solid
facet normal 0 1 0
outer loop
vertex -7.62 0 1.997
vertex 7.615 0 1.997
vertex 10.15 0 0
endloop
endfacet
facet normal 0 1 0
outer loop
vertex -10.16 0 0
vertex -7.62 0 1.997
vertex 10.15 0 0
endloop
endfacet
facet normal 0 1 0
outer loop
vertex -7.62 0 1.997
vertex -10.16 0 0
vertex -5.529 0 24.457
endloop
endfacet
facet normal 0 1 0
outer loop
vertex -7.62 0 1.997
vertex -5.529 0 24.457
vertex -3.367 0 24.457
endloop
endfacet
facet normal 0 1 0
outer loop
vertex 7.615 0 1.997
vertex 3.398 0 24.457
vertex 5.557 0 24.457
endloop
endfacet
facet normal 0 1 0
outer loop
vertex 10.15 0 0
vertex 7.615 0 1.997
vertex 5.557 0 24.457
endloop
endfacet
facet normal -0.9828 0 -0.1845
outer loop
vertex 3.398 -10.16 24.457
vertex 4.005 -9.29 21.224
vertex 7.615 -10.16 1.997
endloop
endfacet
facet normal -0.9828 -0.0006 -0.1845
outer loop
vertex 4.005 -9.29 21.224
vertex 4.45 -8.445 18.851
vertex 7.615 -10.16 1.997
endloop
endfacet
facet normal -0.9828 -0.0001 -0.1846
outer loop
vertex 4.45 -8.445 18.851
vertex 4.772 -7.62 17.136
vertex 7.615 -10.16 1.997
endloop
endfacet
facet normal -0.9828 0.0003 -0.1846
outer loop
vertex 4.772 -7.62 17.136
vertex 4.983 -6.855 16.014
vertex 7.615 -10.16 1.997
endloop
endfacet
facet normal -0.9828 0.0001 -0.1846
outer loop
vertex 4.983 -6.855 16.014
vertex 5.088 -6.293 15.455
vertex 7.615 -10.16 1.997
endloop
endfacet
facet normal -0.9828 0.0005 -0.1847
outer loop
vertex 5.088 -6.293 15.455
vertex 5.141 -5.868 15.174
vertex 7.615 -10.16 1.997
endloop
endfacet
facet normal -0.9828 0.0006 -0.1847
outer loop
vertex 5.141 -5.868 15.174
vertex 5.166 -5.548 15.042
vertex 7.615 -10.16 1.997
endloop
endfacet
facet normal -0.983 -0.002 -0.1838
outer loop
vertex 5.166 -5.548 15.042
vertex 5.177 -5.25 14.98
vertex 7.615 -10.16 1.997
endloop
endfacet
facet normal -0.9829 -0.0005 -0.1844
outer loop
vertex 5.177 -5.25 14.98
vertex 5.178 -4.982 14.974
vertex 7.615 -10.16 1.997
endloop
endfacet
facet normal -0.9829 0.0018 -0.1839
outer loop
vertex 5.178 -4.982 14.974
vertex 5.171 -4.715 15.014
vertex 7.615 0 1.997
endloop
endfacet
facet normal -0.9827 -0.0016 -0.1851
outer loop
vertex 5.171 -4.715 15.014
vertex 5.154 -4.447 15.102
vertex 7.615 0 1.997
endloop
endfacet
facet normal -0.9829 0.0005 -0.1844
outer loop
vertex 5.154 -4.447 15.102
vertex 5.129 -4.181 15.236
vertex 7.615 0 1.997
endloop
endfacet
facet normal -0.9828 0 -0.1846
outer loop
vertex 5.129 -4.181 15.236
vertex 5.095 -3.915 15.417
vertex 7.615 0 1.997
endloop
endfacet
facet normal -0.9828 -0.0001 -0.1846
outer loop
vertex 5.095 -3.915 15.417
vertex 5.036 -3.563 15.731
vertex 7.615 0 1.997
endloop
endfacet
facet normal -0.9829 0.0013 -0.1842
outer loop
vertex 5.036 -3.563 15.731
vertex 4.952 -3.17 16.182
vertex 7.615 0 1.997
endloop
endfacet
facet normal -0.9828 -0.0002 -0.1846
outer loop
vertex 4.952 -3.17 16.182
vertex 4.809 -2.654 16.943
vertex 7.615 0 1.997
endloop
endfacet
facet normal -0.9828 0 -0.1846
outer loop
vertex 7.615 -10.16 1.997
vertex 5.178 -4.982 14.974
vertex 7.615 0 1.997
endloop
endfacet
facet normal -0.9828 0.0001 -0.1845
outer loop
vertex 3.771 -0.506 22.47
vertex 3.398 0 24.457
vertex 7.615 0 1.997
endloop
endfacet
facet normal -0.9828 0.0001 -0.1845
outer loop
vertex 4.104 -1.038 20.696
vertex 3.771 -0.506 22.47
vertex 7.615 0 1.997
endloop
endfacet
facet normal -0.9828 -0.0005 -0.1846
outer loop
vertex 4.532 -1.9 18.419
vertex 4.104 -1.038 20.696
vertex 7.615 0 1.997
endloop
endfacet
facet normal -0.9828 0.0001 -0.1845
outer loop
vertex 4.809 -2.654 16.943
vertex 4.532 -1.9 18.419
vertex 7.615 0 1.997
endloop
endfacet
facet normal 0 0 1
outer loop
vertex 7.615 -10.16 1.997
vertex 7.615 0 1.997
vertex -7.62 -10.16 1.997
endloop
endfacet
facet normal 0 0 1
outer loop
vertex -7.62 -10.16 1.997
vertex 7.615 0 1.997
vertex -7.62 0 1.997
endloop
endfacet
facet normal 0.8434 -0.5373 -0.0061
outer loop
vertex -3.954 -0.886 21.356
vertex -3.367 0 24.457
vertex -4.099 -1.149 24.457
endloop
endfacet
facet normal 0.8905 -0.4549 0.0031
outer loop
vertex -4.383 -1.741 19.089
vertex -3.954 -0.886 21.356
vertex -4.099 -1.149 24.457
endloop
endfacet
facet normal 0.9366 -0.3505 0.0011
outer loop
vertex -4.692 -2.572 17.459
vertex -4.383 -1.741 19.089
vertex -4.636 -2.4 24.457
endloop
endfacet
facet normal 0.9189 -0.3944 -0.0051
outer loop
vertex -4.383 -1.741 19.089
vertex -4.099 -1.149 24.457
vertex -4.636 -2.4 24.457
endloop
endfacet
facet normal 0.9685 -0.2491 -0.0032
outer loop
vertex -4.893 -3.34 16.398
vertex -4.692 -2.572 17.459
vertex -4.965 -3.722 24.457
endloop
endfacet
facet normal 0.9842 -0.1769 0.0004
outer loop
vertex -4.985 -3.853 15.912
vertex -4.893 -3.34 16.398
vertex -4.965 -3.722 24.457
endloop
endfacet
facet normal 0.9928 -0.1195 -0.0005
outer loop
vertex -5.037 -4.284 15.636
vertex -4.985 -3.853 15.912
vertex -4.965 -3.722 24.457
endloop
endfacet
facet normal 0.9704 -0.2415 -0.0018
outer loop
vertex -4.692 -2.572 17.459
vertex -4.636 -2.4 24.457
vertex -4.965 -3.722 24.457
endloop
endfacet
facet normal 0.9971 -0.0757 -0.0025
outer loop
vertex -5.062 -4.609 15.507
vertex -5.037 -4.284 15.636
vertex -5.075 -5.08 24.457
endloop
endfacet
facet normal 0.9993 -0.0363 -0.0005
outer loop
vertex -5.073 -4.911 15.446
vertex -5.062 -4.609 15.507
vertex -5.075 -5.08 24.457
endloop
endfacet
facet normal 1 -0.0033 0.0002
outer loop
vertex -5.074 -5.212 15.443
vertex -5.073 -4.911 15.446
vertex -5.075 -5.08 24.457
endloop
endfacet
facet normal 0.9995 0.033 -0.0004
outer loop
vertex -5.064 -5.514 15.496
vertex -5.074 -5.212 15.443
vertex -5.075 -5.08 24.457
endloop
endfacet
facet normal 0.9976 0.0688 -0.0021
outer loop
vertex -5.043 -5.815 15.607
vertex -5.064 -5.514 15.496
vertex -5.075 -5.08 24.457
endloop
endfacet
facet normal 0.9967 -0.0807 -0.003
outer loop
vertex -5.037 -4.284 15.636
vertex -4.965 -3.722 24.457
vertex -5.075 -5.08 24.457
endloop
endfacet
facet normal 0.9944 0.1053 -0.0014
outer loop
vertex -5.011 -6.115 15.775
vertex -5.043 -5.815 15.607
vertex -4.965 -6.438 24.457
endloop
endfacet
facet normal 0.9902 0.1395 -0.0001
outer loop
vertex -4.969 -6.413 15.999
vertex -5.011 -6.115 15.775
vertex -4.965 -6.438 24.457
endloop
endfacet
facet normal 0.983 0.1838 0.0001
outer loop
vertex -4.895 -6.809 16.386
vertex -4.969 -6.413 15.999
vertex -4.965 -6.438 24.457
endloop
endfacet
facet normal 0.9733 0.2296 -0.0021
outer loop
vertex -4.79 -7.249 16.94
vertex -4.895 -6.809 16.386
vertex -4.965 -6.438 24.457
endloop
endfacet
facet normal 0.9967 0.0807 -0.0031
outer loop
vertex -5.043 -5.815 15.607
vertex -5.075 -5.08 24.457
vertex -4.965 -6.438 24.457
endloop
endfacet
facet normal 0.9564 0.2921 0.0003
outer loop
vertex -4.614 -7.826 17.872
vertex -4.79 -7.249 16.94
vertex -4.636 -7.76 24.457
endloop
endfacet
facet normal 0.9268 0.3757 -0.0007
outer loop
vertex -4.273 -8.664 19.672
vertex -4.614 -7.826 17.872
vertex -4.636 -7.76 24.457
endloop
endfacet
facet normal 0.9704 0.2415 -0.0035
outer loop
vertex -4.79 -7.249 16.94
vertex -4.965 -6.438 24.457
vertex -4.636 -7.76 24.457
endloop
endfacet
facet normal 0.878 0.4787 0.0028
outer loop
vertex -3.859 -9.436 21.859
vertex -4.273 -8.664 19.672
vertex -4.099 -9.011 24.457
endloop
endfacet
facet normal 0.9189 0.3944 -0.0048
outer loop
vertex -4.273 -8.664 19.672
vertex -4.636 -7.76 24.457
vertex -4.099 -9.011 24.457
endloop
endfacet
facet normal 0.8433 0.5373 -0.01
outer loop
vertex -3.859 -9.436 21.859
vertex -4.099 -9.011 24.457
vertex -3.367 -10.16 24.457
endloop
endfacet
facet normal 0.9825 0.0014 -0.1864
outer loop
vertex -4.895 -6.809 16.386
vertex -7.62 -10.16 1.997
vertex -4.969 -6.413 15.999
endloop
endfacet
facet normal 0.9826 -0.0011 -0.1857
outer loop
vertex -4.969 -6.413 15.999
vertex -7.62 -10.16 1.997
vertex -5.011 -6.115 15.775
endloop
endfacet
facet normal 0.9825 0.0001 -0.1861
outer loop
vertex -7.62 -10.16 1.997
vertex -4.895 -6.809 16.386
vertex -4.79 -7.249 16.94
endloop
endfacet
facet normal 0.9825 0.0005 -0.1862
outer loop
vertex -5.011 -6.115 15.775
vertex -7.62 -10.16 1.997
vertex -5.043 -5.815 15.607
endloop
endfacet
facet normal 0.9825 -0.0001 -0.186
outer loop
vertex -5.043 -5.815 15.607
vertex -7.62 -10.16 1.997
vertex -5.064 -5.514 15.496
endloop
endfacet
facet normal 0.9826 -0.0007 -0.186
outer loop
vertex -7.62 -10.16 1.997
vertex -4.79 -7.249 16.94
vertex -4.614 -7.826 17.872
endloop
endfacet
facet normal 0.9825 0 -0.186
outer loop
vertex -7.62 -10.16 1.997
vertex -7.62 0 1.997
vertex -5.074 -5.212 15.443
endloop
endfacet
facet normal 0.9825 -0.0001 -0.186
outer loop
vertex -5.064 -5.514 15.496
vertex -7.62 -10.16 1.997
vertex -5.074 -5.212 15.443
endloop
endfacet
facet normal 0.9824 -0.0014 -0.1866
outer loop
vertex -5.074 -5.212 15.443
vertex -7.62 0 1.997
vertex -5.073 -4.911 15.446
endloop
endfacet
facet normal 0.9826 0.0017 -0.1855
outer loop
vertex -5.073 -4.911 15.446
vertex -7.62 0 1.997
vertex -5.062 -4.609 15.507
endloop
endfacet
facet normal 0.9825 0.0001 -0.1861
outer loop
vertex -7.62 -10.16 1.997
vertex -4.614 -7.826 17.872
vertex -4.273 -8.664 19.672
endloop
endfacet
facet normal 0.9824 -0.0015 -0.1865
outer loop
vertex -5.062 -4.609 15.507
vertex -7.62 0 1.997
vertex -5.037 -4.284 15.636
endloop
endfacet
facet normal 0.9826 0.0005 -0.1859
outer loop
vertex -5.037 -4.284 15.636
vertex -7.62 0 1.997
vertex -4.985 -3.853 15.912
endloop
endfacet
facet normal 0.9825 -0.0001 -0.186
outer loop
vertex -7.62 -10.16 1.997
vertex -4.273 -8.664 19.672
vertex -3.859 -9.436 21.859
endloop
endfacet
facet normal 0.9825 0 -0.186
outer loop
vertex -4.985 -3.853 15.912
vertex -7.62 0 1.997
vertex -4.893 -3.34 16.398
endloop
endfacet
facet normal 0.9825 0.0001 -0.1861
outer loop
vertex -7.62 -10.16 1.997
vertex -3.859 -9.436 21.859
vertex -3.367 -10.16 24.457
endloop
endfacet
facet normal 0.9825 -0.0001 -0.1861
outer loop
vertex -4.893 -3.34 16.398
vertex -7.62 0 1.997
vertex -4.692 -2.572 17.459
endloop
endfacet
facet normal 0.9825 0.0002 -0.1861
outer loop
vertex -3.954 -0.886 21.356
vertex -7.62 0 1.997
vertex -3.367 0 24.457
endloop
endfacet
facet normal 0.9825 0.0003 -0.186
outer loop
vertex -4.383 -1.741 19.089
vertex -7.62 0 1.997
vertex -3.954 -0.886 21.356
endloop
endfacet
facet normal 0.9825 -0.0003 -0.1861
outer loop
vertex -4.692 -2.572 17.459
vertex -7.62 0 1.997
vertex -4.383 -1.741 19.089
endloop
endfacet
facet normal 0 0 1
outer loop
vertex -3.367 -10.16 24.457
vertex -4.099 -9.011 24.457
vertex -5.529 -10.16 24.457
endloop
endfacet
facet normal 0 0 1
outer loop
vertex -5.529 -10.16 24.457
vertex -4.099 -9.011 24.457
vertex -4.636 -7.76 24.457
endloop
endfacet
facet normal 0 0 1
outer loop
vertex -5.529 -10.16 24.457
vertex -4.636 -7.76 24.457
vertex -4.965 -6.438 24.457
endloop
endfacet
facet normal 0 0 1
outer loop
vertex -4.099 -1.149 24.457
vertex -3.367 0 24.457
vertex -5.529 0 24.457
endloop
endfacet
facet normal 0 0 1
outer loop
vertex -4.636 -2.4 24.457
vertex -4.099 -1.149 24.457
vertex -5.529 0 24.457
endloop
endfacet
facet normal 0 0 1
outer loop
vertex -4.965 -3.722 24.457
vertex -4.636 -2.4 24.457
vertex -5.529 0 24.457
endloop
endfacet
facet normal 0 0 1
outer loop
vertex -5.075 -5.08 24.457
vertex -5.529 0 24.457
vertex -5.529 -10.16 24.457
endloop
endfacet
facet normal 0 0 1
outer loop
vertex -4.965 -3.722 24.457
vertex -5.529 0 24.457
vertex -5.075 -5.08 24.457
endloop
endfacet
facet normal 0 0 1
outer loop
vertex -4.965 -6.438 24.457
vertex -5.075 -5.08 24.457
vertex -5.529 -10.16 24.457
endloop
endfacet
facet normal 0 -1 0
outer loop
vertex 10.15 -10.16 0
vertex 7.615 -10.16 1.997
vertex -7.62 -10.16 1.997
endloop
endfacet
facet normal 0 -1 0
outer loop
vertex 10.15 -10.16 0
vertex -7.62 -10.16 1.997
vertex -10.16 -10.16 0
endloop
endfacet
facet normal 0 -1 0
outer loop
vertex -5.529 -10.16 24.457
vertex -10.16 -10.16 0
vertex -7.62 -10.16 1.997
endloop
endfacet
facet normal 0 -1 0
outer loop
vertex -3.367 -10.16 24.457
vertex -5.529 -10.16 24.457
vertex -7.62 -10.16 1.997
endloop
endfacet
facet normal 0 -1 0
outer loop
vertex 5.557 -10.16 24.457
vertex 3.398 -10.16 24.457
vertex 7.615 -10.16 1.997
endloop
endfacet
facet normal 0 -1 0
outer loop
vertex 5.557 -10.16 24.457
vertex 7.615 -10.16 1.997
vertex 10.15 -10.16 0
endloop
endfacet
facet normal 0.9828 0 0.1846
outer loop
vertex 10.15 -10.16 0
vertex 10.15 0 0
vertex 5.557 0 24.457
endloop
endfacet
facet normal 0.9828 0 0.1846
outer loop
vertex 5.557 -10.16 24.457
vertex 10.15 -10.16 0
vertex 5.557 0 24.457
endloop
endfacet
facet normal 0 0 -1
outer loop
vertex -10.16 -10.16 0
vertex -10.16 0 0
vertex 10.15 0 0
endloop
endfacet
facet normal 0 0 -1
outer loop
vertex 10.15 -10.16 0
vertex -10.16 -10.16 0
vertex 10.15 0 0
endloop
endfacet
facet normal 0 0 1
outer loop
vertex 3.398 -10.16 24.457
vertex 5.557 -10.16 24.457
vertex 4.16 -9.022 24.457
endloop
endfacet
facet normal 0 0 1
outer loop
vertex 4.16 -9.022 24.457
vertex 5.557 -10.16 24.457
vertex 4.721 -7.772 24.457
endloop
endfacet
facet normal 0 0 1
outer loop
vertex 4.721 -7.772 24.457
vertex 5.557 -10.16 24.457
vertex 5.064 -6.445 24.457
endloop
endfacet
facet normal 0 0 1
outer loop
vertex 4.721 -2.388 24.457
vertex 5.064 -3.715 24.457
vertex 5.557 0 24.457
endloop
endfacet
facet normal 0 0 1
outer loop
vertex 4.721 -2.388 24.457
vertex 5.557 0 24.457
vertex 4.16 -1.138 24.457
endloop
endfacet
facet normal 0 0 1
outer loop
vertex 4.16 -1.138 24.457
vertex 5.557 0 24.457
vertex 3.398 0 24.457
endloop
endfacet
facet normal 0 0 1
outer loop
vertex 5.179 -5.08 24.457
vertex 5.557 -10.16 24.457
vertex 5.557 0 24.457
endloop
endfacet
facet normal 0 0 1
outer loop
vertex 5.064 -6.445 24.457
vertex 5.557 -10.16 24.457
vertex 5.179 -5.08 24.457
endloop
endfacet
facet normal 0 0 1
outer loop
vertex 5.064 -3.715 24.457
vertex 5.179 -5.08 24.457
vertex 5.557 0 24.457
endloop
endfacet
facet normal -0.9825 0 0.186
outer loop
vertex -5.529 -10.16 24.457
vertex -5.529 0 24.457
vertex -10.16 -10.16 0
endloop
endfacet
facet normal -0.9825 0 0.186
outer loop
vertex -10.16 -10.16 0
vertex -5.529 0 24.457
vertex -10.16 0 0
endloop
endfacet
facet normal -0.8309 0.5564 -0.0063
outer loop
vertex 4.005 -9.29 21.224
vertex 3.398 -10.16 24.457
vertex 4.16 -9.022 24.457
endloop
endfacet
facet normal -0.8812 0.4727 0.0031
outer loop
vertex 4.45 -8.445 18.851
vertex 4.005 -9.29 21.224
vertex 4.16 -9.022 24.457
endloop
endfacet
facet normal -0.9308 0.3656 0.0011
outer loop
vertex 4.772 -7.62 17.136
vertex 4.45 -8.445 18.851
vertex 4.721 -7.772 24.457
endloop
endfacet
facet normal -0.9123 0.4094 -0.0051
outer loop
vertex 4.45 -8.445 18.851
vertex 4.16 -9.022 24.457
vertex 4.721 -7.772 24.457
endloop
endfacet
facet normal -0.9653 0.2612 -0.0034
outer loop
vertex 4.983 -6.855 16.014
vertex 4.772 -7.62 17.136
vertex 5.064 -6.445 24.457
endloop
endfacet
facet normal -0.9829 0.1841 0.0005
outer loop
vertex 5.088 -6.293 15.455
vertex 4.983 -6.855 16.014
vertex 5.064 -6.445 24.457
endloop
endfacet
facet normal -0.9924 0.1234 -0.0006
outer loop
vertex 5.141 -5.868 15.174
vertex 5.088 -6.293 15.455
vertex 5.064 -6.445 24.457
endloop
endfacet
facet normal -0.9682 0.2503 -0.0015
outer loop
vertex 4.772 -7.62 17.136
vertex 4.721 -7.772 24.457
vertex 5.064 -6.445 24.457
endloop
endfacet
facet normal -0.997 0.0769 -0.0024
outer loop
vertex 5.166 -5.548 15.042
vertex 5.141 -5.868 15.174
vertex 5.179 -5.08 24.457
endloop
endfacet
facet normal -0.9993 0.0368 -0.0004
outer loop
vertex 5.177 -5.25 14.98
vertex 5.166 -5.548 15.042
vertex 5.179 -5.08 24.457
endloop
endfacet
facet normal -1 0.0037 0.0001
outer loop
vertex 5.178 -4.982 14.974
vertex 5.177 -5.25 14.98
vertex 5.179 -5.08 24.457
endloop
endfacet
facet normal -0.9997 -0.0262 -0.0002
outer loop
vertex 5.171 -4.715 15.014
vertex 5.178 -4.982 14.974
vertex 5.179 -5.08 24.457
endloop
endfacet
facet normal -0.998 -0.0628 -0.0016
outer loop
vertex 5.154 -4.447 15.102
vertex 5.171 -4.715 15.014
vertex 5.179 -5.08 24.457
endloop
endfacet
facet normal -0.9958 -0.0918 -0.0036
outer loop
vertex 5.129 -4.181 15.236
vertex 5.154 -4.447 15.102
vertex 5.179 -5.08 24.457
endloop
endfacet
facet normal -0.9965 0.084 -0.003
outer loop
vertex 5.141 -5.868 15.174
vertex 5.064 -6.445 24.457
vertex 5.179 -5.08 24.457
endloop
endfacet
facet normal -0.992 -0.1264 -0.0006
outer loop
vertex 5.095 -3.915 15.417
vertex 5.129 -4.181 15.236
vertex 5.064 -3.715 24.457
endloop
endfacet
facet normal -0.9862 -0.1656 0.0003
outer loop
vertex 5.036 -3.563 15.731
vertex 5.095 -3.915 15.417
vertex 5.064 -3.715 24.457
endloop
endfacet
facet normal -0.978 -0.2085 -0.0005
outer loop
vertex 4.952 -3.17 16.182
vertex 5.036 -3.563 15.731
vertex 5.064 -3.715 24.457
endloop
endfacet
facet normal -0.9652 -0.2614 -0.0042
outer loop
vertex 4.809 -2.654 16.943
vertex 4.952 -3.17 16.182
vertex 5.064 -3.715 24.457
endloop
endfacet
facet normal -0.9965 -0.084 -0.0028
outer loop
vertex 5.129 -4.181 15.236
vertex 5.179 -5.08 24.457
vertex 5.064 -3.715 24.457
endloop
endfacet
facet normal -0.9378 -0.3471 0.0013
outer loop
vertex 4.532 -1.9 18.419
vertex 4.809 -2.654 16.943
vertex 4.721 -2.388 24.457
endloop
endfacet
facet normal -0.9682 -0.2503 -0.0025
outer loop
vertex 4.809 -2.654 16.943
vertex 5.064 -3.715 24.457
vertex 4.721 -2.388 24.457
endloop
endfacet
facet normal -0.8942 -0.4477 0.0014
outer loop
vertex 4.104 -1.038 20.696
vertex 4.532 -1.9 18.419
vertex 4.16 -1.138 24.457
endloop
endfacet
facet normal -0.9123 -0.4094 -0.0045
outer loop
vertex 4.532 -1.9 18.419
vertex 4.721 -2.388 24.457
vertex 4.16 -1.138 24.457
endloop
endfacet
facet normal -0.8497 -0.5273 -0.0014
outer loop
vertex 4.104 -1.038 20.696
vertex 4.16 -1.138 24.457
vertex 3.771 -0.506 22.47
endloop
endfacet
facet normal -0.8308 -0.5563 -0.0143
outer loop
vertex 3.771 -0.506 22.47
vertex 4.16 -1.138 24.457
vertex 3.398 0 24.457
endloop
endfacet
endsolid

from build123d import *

# Parameters (mm, degrees)
F1_DEPTH = 10.16
F3_DEPTH = 20.32
F5_DEPTH = 20.32


with BuildPart() as f1:
    # F0 (on Front) → F1 (new body)
    with BuildSketch(Plane.XZ):
        Polygon((-10.16, 0), (0, 0), (10.149805, 0), (5.557302, 24.457385), (3.397579, 24.457385), (7.615184, 1.996521), (0, 1.996521), (-7.62, 1.996521), (-3.366859, 24.457385), (-5.528802, 24.457385), align=None)
    extrude(amount=F1_DEPTH)

    # F2 (on face) → F3 (cut)
    with BuildSketch(Plane.XY.offset(24.457385)):
        with BuildLine():
            Line((-3.366859, -10.16), (-3.366859, 0))
            ThreePointArc((-3.366859, 0), (-5.074936, -5.08), (-3.366859, -10.16))
        make_face()
    extrude(amount=-F3_DEPTH, mode=Mode.SUBTRACT)

    # F4 (on face) → F5 (cut)
    with BuildSketch(Plane.XY.offset(24.457385)):
        with BuildLine():
            Line((3.397579, 0), (3.397579, -10.16))
            ThreePointArc((3.397579, -10.16), (5.178992, -5.08), (3.397579, 0))
        make_face()
    extrude(amount=-F5_DEPTH, mode=Mode.SUBTRACT)


solid = f1.part
